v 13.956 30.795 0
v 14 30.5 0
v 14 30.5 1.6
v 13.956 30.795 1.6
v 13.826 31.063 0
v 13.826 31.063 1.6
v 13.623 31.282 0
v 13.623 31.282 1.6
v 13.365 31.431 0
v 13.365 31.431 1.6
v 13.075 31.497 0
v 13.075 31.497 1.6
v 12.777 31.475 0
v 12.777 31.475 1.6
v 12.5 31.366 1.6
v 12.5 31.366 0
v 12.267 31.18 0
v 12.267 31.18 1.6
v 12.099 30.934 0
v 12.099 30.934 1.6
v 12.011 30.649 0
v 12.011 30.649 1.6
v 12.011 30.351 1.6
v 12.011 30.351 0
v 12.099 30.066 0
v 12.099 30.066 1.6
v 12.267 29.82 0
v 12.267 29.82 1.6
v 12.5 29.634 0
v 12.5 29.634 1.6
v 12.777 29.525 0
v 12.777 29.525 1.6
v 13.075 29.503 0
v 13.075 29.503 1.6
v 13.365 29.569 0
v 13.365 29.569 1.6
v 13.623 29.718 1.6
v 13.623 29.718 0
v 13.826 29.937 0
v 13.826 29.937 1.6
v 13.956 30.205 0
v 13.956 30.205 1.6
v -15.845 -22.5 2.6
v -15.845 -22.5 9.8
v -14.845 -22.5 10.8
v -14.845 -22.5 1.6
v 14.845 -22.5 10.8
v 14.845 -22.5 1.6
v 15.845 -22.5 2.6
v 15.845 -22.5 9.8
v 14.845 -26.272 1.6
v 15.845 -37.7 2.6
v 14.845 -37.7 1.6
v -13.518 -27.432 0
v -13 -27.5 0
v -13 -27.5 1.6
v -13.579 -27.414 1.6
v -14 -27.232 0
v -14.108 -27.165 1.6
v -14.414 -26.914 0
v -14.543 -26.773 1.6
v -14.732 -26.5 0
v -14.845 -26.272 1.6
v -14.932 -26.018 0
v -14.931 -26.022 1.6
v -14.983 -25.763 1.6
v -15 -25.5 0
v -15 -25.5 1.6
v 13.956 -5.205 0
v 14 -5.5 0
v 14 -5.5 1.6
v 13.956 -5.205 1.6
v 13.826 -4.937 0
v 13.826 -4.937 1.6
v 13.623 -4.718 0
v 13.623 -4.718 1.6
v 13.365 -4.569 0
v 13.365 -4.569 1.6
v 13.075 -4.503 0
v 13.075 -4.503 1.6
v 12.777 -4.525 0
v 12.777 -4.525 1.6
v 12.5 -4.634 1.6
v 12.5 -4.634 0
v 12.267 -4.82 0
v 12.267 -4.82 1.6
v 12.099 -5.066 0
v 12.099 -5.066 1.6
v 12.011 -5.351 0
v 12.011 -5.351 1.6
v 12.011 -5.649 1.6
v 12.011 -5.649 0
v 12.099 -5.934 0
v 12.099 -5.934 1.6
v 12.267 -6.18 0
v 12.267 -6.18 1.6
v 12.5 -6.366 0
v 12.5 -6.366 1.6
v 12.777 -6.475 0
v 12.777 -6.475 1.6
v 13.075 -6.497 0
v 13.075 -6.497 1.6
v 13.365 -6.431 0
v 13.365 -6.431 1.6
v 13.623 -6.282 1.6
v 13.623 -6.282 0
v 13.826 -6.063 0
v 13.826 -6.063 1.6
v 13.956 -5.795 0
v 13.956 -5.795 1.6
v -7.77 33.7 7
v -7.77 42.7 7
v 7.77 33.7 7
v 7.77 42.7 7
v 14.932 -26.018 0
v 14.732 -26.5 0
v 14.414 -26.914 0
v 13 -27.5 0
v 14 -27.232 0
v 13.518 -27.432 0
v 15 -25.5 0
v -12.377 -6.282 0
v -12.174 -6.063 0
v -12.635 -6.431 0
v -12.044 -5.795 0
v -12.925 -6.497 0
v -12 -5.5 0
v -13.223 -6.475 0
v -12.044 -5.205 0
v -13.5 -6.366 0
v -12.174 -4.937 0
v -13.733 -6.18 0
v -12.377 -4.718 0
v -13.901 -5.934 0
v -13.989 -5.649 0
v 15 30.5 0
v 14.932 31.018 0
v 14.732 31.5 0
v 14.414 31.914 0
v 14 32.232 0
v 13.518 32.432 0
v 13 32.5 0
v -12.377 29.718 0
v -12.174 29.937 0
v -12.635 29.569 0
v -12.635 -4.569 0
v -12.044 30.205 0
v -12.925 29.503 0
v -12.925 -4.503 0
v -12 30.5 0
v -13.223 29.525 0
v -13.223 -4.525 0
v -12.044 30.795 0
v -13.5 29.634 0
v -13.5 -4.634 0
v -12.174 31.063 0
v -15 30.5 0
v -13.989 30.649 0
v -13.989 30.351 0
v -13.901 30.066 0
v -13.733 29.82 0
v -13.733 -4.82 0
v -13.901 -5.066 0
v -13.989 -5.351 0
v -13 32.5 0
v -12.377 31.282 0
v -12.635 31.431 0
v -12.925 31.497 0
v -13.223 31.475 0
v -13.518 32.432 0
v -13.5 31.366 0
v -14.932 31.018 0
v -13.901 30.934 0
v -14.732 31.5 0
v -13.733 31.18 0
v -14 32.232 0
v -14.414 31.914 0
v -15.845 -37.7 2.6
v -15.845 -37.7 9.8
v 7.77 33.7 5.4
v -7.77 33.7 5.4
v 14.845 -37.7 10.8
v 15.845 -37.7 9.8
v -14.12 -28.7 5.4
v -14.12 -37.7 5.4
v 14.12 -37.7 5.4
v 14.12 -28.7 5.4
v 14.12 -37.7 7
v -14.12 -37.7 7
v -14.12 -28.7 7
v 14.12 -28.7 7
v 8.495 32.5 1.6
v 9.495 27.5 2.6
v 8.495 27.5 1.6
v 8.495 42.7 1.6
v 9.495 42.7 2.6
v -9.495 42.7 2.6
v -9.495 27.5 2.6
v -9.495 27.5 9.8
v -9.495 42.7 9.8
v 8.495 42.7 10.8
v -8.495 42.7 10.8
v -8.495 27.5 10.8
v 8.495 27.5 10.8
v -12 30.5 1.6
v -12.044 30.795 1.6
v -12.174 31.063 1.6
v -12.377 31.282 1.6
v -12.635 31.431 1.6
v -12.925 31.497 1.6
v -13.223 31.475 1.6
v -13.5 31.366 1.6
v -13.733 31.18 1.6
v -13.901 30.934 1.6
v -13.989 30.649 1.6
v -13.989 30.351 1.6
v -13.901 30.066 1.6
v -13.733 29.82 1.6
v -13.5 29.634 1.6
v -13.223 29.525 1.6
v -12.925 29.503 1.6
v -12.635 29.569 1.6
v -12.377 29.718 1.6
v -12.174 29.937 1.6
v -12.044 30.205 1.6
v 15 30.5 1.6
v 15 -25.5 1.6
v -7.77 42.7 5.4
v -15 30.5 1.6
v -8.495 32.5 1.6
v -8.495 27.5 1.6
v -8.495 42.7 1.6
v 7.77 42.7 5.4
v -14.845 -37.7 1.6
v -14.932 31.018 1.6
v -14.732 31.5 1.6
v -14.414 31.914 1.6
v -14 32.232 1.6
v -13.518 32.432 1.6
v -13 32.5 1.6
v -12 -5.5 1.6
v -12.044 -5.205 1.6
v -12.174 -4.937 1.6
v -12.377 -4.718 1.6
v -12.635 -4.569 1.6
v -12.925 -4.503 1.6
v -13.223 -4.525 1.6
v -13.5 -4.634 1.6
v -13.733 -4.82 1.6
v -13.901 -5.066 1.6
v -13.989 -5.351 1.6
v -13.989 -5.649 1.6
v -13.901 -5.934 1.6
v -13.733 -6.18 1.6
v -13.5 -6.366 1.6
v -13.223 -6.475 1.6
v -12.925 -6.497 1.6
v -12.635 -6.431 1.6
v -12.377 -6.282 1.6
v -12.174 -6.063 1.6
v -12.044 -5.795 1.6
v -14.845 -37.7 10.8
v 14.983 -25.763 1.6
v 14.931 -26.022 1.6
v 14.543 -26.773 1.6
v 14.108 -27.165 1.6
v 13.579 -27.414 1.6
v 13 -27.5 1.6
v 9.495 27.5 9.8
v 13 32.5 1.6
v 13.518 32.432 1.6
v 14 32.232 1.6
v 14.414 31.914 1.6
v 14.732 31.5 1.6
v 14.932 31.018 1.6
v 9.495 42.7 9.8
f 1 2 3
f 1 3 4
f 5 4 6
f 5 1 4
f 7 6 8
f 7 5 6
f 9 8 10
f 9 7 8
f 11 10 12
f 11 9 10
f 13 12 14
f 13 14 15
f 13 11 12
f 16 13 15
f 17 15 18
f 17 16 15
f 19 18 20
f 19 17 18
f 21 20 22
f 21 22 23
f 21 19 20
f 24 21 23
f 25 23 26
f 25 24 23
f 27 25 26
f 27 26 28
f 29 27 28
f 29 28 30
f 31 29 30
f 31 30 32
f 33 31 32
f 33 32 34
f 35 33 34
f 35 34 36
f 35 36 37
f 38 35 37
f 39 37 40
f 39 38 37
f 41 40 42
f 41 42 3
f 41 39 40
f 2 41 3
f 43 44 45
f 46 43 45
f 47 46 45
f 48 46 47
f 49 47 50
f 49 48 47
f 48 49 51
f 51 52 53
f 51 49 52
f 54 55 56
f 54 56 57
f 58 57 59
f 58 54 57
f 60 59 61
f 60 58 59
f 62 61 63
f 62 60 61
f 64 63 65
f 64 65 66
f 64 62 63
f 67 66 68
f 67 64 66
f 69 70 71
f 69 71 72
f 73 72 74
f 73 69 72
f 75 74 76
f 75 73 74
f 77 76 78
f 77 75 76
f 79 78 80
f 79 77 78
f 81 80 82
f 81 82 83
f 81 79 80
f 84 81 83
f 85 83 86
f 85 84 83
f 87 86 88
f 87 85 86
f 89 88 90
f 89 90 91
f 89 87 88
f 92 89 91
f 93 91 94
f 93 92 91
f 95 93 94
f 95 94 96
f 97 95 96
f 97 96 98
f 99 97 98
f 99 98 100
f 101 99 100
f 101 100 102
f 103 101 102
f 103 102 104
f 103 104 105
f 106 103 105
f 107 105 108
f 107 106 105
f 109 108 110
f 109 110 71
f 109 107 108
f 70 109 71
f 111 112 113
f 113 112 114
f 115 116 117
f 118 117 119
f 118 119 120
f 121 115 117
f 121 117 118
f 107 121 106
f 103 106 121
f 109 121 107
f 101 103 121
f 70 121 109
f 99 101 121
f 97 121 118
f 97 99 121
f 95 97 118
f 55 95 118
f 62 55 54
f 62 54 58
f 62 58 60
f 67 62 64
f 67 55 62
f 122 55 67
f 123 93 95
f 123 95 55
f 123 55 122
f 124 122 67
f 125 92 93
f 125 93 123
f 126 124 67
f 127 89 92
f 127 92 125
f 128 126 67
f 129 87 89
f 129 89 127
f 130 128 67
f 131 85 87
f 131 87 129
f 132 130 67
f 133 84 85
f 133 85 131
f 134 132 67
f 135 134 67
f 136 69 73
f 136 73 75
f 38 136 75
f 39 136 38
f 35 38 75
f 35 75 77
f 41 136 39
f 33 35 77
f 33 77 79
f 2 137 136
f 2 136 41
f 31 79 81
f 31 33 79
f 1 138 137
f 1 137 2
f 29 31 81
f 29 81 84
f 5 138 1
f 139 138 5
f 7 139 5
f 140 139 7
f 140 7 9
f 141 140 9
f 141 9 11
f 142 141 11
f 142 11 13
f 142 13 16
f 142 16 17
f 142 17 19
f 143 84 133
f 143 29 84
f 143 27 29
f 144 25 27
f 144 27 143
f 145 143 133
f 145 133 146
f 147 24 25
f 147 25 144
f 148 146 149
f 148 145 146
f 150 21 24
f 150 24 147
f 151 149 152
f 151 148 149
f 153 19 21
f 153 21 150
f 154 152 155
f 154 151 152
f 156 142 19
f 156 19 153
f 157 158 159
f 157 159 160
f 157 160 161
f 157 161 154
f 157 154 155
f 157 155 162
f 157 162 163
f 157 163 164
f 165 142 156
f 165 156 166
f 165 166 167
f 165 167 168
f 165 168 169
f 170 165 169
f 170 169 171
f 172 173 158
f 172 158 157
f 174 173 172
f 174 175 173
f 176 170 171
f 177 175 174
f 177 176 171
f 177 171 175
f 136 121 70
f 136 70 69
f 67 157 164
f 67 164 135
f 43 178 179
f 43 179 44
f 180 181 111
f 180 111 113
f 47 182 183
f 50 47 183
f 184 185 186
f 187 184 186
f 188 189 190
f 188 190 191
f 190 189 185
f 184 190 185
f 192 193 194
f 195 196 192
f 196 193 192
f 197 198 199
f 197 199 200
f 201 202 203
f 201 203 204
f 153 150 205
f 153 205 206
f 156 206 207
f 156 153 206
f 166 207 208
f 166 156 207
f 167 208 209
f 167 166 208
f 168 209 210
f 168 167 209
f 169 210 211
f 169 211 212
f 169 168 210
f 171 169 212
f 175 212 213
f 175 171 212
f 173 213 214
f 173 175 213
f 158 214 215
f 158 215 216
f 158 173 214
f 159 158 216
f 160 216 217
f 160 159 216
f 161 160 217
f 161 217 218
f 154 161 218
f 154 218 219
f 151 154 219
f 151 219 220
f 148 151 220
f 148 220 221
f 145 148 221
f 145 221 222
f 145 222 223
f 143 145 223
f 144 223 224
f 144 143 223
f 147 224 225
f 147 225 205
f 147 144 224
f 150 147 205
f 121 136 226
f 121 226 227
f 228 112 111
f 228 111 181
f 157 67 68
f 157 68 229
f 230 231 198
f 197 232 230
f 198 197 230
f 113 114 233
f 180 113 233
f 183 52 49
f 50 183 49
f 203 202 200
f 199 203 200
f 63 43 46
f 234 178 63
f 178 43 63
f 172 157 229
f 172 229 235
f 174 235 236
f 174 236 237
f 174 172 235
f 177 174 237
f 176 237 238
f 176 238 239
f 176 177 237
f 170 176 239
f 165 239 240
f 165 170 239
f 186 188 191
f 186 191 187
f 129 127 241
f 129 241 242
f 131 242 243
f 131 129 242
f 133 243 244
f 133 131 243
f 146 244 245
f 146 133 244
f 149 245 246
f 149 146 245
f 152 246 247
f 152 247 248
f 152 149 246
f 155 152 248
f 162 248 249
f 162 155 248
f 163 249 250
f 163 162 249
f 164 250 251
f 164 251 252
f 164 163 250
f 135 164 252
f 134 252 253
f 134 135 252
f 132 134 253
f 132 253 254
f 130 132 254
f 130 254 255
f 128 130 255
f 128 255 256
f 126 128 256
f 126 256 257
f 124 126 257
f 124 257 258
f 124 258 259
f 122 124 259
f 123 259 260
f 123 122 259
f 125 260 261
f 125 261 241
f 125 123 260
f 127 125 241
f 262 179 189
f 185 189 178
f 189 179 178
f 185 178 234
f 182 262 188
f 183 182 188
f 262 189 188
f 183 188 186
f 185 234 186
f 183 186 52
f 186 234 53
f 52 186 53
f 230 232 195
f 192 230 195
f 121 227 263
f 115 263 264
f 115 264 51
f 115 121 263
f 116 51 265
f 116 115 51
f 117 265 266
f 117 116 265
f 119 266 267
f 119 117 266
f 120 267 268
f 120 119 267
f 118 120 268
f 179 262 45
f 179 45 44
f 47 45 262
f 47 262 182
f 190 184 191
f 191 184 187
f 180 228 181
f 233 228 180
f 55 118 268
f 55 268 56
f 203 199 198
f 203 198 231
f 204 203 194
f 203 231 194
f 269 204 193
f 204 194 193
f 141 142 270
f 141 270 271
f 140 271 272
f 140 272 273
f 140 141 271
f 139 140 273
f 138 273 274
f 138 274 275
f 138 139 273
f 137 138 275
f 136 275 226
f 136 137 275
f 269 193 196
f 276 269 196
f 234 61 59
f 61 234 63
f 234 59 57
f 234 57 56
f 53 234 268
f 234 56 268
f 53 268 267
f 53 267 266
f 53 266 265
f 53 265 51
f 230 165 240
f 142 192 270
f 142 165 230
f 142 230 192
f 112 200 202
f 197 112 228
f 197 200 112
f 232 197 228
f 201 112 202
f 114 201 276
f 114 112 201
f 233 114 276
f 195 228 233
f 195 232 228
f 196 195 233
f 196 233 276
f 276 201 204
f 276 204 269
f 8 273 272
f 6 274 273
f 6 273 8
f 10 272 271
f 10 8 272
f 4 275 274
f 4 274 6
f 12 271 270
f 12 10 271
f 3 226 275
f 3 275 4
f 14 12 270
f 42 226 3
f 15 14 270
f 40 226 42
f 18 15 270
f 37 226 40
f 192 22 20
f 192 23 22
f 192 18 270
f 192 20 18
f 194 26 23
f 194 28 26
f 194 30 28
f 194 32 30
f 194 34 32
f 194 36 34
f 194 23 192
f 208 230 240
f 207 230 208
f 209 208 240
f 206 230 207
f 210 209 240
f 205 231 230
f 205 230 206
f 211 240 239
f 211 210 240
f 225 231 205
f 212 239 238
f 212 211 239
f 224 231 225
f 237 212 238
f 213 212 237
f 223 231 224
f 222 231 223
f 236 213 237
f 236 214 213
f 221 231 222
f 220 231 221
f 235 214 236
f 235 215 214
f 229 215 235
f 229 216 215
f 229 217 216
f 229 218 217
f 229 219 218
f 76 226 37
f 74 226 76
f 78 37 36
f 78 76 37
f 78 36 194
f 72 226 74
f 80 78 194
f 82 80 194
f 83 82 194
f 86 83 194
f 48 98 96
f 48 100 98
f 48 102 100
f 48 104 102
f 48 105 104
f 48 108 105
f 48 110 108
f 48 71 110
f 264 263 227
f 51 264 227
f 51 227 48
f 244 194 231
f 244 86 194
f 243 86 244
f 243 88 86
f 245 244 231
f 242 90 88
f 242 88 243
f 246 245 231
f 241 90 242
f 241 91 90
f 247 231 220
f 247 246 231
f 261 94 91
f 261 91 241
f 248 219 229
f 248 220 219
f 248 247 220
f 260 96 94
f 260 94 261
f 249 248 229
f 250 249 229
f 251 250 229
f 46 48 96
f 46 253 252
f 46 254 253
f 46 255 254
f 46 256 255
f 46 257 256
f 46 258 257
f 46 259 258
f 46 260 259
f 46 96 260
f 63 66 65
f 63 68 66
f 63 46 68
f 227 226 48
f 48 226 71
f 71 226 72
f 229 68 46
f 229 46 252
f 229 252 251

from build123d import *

# Parameters (mm, degrees)
SKETCH_1_R          = 1
EXTRUDE_1_DEPTH     = 1.6
SKETCH_2_R          = 1
CUT_EXTRUDE_1_DEPTH = 1.6
EXTRUDE_START       = 1.6
SKETCH_4_W          = 18.99
SKETCH_4_H          = 15.2
EXTRUDE_2_DEPTH     = 9.2
CUT_EXTRUDE_START   = 42.7
CUT_EXTRUDE_2_DEPTH = 15.2
SKETCH_6_W          = 15.54
SKETCH_6_H          = 1.6
CUT_EXTRUDE_3_DEPTH = 9
SKETCH_7_W          = 31.69
SKETCH_7_H          = 15.2
EXTRUDE_3_DEPTH     = 9.2
CUT_EXTRUDE_START_2 = -37.7
SKETCH_9_W          = 28.24
SKETCH_9_H          = 1.6
CUT_EXTRUDE_5_DEPTH = 9
CUT_EXTRUDE_6_DEPTH = 15.2


with BuildPart() as part:
    # 草图1 → 凸台-拉伸1 (new body)
    with BuildSketch(Plane.XY):
        with BuildLine():
            Line((-13, 32.5), (13, 32.5))
            ThreePointArc((13, 32.5), (14.414213562, 31.914213562), (15, 30.5))
            Line((15, 30.5), (15, -25.5))
            ThreePointArc((15, -25.5), (14.414213562, -26.914213562), (13, -27.5))
            Line((13, -27.5), (-13, -27.5))
            ThreePointArc((-13, -27.5), (-14.414213562, -26.914213562), (-15, -25.5))
            Line((-15, -25.5), (-15, 30.5))
            ThreePointArc((-15, 30.5), (-14.414213562, 31.914213562), (-13, 32.5))
        make_face()
        with Locations((-13, 30.5)):
            Circle(SKETCH_1_R, mode=Mode.SUBTRACT)
        with Locations((13, 30.5)):
            Circle(SKETCH_1_R, mode=Mode.SUBTRACT)
    extrude(amount=EXTRUDE_1_DEPTH)

    # 草图2 → 切除-拉伸1 (cut)
    with BuildSketch(Plane.XY):
        with Locations((-13, -5.5)):
            Circle(SKETCH_2_R)
        with Locations((13, -5.5)):
            Circle(SKETCH_2_R)
    extrude(amount=CUT_EXTRUDE_1_DEPTH, mode=Mode.SUBTRACT)

    # 草图4 → 凸台-拉伸2 (add)
    with BuildSketch(Plane.XY.offset(EXTRUDE_START)):
        with Locations((0, 35.1)):
            Rectangle(SKETCH_4_W, SKETCH_4_H)
    extrude(amount=EXTRUDE_2_DEPTH)

    # 草图5 → 切除-拉伸2 (cut)
    with BuildSketch(Plane(origin=(0, 0, 0), x_dir=(1, 0, 0), z_dir=(0, 1, 0)).offset(CUT_EXTRUDE_START)):
        Polygon((-9.495, -10.8), (-8.495, -10.8), (-9.495, -9.8), align=None)
        Polygon((9.495, -10.8), (8.495, -10.8), (9.495, -9.8), align=None)
        Polygon((9.495, -1.6), (9.495, -2.6), (8.495, -1.6), align=None)
        Polygon((-9.495, -1.6), (-8.495, -1.6), (-9.495, -2.6), align=None)
    extrude(amount=-CUT_EXTRUDE_2_DEPTH, mode=Mode.SUBTRACT)

    # 草图6 → 切除-拉伸3 (cut)
    with BuildSketch(Plane(origin=(0, 0, 0), x_dir=(1, 0, 0), z_dir=(0, 1, 0)).offset(CUT_EXTRUDE_START)):
        with Locations((0, -6.2)):
            Rectangle(SKETCH_6_W, SKETCH_6_H)
    extrude(amount=-CUT_EXTRUDE_3_DEPTH, mode=Mode.SUBTRACT)

    # 草图7 → 凸台-拉伸3 (add)
    with BuildSketch(Plane.XY.offset(EXTRUDE_START)):
        with Locations((0, -30.1)):
            Rectangle(SKETCH_7_W, SKETCH_7_H)
    extrude(amount=EXTRUDE_3_DEPTH)

    # 草图9 → 切除-拉伸5 (cut)
    with BuildSketch(Plane(origin=(0, 0, 0), x_dir=(1, 0, 0), z_dir=(0, 1, 0)).offset(CUT_EXTRUDE_START_2)):
        with Locations((0, -6.2)):
            Rectangle(SKETCH_9_W, SKETCH_9_H)
    extrude(amount=CUT_EXTRUDE_5_DEPTH, mode=Mode.SUBTRACT)

    # 草图10 → 切除-拉伸6 (cut)
    with BuildSketch(Plane(origin=(0, 0, 0), x_dir=(1, 0, 0), z_dir=(0, 1, 0)).offset(CUT_EXTRUDE_START_2)):
        Polygon((15.845, -10.8), (14.845, -10.8), (15.845, -9.8), align=None)
        Polygon((-15.845, -10.8), (-14.845, -10.8), (-15.845, -9.8), align=None)
        Polygon((-15.845, -2.6), (-14.845, -1.6), (-15.845, -1.6), align=None)
        Polygon((15.845, -2.6), (14.845, -1.6), (15.845, -1.6), align=None)
    extrude(amount=CUT_EXTRUDE_6_DEPTH, mode=Mode.SUBTRACT)


solid = part.part
